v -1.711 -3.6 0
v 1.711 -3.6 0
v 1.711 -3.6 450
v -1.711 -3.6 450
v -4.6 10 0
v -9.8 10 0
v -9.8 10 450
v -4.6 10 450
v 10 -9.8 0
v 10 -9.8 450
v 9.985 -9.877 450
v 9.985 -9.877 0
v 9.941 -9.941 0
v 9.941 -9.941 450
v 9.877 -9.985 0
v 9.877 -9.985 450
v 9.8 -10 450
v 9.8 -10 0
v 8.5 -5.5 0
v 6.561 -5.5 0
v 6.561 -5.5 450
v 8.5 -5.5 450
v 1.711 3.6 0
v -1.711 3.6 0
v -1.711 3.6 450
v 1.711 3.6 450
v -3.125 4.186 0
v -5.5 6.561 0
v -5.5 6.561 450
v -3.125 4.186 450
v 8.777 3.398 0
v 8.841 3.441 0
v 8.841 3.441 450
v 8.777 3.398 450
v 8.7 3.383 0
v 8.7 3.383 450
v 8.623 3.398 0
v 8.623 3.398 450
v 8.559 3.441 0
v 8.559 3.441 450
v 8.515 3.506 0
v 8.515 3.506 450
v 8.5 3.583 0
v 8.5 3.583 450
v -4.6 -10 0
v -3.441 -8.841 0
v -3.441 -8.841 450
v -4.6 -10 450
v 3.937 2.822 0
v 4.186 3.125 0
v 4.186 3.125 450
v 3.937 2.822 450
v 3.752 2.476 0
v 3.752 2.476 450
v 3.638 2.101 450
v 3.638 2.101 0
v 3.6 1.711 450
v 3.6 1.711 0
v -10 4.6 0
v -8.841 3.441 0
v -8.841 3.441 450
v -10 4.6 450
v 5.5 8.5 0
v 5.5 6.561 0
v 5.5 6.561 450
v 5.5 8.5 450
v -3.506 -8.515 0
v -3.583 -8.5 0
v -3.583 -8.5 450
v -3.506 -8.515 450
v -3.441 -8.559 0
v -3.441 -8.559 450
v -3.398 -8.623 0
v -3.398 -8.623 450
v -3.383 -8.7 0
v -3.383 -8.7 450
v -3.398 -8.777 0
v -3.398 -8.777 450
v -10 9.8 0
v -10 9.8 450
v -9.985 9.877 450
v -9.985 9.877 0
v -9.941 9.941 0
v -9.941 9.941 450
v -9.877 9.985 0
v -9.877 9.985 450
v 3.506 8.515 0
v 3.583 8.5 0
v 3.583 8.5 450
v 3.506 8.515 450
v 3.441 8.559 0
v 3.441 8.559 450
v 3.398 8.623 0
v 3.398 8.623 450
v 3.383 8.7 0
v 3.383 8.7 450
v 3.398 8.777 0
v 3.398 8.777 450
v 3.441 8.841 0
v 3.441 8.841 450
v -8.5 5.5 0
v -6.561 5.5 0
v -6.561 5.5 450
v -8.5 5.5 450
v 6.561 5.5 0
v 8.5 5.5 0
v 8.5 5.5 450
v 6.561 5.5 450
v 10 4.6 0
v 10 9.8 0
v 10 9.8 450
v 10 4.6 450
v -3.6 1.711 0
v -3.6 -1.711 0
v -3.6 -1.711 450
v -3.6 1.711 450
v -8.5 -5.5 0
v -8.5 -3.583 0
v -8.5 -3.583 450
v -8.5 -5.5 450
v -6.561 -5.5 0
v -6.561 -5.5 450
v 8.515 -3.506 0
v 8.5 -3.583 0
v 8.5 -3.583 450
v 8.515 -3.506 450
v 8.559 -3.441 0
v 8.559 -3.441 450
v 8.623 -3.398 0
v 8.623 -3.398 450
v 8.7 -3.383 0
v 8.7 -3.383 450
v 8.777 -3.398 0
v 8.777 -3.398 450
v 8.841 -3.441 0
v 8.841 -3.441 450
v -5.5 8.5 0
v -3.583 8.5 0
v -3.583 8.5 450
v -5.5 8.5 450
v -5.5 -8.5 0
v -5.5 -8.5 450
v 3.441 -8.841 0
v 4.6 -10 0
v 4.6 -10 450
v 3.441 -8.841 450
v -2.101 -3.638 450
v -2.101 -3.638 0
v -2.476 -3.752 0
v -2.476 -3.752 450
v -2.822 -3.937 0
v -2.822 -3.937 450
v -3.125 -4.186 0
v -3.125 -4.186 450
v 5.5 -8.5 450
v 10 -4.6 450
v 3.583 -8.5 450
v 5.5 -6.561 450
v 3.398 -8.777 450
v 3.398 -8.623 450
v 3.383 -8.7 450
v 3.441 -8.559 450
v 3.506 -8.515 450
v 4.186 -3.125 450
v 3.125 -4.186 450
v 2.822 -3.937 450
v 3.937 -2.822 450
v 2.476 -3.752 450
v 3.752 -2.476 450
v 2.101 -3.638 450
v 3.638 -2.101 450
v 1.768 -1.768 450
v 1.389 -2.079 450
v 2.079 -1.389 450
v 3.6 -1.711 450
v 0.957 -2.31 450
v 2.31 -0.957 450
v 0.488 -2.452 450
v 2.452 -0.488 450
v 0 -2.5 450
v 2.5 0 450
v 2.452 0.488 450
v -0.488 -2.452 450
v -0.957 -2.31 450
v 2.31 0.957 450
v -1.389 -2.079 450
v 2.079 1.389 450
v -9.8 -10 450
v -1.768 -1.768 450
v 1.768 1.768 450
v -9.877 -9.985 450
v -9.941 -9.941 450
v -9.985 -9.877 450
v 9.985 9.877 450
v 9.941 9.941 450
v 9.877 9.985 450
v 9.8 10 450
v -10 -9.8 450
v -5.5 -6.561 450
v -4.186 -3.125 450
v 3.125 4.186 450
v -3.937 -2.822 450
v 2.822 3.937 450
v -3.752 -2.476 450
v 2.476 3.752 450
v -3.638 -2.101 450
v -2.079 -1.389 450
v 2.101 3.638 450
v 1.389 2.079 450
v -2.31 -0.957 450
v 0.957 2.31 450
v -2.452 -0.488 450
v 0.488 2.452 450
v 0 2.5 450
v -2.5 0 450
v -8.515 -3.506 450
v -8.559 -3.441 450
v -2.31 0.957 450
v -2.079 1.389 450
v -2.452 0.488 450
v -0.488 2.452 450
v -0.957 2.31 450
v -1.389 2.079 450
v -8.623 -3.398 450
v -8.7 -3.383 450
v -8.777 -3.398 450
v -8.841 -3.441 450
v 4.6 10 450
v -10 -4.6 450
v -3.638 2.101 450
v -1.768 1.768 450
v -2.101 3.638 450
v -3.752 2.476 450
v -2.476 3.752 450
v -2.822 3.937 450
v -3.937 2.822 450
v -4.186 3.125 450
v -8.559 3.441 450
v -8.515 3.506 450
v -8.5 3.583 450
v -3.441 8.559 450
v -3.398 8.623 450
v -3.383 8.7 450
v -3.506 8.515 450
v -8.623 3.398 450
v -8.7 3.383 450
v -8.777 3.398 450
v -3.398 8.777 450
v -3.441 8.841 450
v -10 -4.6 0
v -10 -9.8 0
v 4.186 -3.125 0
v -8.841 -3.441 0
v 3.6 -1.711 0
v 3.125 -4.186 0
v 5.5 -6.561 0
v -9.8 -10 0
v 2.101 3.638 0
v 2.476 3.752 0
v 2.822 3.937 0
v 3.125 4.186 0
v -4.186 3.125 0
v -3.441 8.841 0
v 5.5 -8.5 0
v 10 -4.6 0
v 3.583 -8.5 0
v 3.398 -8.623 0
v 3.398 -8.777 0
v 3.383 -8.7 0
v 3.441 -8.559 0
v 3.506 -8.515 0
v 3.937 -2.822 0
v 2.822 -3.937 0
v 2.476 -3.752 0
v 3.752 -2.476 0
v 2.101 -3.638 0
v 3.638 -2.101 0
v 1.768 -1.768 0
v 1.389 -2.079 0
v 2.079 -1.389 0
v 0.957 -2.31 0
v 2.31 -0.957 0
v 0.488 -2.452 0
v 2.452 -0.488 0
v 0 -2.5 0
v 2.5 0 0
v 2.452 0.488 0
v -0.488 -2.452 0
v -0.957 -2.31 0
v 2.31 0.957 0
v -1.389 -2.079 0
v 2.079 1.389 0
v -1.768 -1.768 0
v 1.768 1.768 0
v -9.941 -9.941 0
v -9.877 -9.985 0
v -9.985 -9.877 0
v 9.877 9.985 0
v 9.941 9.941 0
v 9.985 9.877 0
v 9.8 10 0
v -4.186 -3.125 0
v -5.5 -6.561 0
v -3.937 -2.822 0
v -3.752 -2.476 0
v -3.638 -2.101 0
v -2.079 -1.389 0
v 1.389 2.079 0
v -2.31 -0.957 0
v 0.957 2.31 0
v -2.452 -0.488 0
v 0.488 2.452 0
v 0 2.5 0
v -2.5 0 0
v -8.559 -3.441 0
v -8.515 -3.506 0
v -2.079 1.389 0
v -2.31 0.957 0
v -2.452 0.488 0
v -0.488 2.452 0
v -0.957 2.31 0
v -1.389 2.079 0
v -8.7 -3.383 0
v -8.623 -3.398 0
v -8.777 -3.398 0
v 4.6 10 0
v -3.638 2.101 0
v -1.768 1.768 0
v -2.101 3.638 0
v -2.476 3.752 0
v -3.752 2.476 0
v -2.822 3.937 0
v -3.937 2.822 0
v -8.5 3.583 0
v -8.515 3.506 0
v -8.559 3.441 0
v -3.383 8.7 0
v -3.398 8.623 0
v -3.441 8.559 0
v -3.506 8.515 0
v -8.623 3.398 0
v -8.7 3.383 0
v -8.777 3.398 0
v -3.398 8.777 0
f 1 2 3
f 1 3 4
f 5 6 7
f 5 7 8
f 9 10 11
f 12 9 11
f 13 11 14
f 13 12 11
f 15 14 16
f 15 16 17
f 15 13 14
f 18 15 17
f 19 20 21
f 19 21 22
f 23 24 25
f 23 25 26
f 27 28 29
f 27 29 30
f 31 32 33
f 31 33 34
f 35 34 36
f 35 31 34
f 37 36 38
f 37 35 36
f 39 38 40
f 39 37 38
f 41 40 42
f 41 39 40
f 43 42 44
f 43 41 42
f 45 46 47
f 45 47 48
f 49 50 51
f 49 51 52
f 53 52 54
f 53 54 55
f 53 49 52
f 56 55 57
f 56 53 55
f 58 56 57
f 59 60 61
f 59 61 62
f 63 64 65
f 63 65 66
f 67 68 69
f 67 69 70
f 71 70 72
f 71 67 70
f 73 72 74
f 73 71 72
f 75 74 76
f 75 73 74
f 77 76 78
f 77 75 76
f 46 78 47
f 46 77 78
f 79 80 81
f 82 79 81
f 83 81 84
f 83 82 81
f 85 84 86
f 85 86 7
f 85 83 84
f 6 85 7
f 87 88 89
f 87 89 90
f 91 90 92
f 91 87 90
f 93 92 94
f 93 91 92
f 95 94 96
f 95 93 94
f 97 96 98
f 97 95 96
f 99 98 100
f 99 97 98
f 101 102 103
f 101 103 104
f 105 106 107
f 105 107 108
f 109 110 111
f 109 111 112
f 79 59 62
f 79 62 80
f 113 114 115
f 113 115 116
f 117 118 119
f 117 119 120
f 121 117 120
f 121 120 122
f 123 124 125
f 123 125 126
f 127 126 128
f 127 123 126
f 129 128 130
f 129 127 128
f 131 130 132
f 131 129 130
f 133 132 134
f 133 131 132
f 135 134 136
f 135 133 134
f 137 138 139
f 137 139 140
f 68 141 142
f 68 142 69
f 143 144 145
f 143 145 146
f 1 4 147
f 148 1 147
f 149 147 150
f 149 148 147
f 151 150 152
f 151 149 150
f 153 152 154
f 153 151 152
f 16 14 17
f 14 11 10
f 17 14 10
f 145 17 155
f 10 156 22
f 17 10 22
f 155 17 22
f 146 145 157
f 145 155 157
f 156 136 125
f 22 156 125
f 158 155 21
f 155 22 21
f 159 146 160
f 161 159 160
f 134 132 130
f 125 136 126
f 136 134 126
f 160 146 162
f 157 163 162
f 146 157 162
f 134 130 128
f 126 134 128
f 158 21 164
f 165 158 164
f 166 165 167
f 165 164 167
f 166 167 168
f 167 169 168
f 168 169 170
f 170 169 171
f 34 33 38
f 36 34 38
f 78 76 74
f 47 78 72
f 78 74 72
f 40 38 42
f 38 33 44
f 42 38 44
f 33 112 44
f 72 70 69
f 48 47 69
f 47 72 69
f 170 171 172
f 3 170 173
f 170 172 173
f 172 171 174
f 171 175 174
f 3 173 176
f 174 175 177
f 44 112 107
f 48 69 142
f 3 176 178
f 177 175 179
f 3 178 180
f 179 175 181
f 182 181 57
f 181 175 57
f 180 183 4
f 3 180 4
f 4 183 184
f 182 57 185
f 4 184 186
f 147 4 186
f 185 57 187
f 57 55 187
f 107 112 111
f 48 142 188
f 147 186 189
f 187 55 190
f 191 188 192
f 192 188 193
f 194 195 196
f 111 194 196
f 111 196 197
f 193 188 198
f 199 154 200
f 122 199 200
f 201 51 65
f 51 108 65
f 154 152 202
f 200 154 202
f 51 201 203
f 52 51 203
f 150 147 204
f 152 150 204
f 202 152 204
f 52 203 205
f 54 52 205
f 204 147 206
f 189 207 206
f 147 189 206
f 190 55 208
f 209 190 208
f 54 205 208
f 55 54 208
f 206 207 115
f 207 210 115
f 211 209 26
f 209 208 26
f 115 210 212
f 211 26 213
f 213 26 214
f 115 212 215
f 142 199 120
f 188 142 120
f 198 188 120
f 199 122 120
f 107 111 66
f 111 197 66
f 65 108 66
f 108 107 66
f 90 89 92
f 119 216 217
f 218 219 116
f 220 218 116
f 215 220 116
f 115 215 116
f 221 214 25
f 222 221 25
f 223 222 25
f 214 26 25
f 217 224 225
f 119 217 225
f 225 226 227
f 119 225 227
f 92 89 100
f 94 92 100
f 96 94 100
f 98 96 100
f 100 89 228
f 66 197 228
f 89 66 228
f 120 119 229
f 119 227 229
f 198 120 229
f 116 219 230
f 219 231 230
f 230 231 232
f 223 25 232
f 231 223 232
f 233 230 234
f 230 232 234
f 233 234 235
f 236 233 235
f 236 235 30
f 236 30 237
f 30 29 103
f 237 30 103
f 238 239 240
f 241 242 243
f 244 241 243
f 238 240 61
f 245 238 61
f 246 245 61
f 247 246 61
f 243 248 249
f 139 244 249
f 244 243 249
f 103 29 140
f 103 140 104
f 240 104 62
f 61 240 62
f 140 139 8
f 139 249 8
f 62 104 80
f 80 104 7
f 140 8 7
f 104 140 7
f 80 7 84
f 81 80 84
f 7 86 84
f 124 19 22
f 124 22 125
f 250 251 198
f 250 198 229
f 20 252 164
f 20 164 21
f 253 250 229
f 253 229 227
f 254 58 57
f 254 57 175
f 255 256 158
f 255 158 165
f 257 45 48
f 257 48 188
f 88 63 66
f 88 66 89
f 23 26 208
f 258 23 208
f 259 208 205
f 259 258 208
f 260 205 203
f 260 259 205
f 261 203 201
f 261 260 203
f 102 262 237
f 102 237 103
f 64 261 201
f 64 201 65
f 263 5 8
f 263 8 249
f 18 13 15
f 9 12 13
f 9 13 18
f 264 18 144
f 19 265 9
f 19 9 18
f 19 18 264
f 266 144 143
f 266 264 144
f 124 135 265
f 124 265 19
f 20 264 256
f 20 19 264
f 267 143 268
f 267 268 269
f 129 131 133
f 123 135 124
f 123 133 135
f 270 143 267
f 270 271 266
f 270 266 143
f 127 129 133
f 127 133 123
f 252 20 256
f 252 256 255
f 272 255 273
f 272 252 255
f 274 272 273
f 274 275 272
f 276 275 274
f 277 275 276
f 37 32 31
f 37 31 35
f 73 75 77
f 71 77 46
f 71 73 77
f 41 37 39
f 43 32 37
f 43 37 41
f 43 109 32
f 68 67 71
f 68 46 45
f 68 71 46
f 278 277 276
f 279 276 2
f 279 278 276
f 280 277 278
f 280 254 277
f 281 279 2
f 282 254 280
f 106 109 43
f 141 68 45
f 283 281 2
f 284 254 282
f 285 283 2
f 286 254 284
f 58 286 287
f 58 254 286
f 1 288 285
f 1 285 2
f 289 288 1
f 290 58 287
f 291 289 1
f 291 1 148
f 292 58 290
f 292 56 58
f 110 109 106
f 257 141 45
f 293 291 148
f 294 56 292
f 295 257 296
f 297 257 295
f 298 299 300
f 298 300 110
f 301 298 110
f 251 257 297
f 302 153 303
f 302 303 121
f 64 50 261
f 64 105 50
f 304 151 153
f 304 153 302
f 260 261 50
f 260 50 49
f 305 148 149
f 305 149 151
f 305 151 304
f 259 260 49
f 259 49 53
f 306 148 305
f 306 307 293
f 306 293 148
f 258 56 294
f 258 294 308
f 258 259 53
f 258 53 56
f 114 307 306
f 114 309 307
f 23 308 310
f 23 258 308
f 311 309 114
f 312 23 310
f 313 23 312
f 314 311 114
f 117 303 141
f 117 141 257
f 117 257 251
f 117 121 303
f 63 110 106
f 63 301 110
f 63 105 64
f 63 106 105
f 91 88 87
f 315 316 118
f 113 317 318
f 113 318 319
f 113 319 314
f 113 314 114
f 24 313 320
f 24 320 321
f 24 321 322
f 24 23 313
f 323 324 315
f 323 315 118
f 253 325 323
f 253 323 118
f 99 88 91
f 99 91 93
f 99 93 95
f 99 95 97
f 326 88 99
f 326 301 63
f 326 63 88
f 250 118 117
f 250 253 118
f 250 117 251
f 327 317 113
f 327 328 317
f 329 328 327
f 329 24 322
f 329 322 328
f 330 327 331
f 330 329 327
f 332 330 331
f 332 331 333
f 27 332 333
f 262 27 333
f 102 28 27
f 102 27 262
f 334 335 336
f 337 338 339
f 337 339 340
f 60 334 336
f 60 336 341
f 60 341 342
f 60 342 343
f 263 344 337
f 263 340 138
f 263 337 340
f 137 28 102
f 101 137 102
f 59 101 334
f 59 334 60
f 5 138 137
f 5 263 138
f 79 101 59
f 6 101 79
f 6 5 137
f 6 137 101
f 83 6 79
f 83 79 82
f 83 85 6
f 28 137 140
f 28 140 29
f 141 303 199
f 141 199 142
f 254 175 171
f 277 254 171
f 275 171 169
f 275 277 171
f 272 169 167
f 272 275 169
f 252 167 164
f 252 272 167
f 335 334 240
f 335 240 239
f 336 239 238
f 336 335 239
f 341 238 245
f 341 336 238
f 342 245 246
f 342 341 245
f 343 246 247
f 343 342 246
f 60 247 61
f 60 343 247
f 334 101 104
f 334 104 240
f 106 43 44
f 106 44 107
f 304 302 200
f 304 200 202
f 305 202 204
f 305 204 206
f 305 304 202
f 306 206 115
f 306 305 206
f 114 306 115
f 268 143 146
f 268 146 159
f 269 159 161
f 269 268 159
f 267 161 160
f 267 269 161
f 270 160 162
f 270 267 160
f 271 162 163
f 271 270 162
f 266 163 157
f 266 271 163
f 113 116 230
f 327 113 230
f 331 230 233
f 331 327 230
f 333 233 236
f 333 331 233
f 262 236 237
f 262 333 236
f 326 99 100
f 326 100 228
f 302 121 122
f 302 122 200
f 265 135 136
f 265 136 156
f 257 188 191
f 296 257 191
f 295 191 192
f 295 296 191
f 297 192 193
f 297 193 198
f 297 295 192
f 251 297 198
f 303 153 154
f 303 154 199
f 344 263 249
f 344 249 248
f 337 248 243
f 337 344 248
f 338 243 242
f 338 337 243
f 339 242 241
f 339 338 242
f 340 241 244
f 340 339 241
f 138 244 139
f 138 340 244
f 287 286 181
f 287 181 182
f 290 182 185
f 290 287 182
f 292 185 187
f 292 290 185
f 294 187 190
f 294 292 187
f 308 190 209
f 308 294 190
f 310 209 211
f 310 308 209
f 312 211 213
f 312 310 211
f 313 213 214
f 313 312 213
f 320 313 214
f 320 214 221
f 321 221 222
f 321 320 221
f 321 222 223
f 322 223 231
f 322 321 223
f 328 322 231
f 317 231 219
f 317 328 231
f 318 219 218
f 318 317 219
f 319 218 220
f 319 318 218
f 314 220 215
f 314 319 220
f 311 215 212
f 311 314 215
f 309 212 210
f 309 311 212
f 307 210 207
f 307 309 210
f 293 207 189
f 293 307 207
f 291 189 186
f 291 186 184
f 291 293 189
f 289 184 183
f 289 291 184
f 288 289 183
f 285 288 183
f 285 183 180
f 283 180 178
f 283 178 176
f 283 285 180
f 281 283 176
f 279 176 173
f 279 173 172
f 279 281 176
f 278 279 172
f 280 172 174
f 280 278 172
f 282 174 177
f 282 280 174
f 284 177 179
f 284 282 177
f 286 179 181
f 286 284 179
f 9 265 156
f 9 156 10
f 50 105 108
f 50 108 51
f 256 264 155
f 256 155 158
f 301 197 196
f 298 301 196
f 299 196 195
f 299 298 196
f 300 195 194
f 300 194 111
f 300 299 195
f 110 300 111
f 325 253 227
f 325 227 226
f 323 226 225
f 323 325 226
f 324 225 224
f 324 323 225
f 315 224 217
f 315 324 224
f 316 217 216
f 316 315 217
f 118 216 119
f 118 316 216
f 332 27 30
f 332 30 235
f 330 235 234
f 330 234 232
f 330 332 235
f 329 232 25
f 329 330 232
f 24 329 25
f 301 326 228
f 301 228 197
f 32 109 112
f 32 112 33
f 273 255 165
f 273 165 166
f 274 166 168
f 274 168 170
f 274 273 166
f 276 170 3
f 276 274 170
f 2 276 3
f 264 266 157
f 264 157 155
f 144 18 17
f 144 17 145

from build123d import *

# Parameters (mm, degrees)
ESBO_O1_R                = 2.5
RESSALTO_EXTRUS_O1_DEPTH = 450


with BuildPart() as part:
    # Esboço1 → Ressalto-extrusão1 (new body)
    with BuildSketch(Plane.XY):
        with BuildLine():
            Line((-4.6, -10), (-9.8, -10))
            ThreePointArc((-9.8, -10), (-9.941421356, -9.941421356), (-10, -9.8))
            Line((-10, -9.8), (-10, -4.6))
            Line((-10, -4.6), (-8.841421356, -3.441421356))
            ThreePointArc((-8.841421356, -3.441421356), (-8.623463314, -3.398066806), (-8.5, -3.582842712))
            Line((-8.5, -3.582842712), (-8.5, -5.5))
            Line((-8.5, -5.5), (-6.560660172, -5.5))
            Line((-6.560660172, -5.5), (-4.185786438, -3.125126266))
            ThreePointArc((-4.185786438, -3.125126266), (-3.752240935, -2.476279568), (-3.6, -1.710912703))
            Line((-3.6, -1.710912703), (-3.6, 1.710912703))
            ThreePointArc((-3.6, 1.710912703), (-3.752240935, 2.476279568), (-4.185786438, 3.125126266))
            Line((-4.185786438, 3.125126266), (-6.560660172, 5.5))
            Line((-6.560660172, 5.5), (-8.5, 5.5))
            Line((-8.5, 5.5), (-8.5, 3.582842712))
            ThreePointArc((-8.5, 3.582842712), (-8.623463314, 3.398066806), (-8.841421356, 3.441421356))
            Line((-8.841421356, 3.441421356), (-10, 4.6))
            Line((-10, 4.6), (-10, 9.8))
            ThreePointArc((-10, 9.8), (-9.941421356, 9.941421356), (-9.8, 10))
            Line((-9.8, 10), (-4.6, 10))
            Line((-4.6, 10), (-3.441421356, 8.841421356))
            ThreePointArc((-3.441421356, 8.841421356), (-3.398066806, 8.623463314), (-3.582842712, 8.5))
            Line((-3.582842712, 8.5), (-5.5, 8.5))
            Line((-5.5, 8.5), (-5.5, 6.560660172))
            Line((-5.5, 6.560660172), (-3.125126266, 4.185786438))
            ThreePointArc((-3.125126266, 4.185786438), (-2.476279568, 3.752240935), (-1.710912703, 3.6))
            Line((-1.710912703, 3.6), (1.710912703, 3.6))
            ThreePointArc((1.710912703, 3.6), (2.476279568, 3.752240935), (3.125126266, 4.185786438))
            Line((3.125126266, 4.185786438), (5.5, 6.560660172))
            Line((5.5, 6.560660172), (5.5, 8.5))
            Line((5.5, 8.5), (3.582842712, 8.5))
            ThreePointArc((3.582842712, 8.5), (3.398066806, 8.623463314), (3.441421356, 8.841421356))
            Line((3.441421356, 8.841421356), (4.6, 10))
            Line((4.6, 10), (9.8, 10))
            ThreePointArc((9.8, 10), (9.941421356, 9.941421356), (10, 9.8))
            Line((10, 9.8), (10, 4.6))
            Line((10, 4.6), (8.841421356, 3.441421356))
            ThreePointArc((8.841421356, 3.441421356), (8.623463314, 3.398066806), (8.5, 3.582842712))
            Line((8.5, 3.582842712), (8.5, 5.5))
            Line((8.5, 5.5), (6.560660172, 5.5))
            Line((6.560660172, 5.5), (4.185786438, 3.125126266))
            ThreePointArc((4.185786438, 3.125126266), (3.752240935, 2.476279568), (3.6, 1.710912703))
            Line((3.6, 1.710912703), (3.6, -1.710912703))
            ThreePointArc((3.6, -1.710912703), (3.752240935, -2.476279568), (4.185786438, -3.125126266))
            Line((4.185786438, -3.125126266), (6.560660172, -5.5))
            Line((6.560660172, -5.5), (8.5, -5.5))
            Line((8.5, -5.5), (8.5, -3.582842712))
            ThreePointArc((8.5, -3.582842712), (8.623463314, -3.398066806), (8.841421356, -3.441421356))
            Line((8.841421356, -3.441421356), (10, -4.6))
            Line((10, -4.6), (10, -9.8))
            ThreePointArc((10, -9.8), (9.941421356, -9.941421356), (9.8, -10))
            Line((9.8, -10), (4.6, -10))
            Line((4.6, -10), (3.441421356, -8.841421356))
            ThreePointArc((3.441421356, -8.841421356), (3.398066806, -8.623463314), (3.582842712, -8.5))
            Line((3.582842712, -8.5), (5.5, -8.5))
            Line((5.5, -8.5), (5.5, -6.560660172))
            Line((5.5, -6.560660172), (3.125126266, -4.185786438))
            ThreePointArc((3.125126266, -4.185786438), (2.476279568, -3.752240935), (1.710912703, -3.6))
            Line((1.710912703, -3.6), (-1.710912703, -3.6))
            ThreePointArc((-1.710912703, -3.6), (-2.476279568, -3.752240935), (-3.125126266, -4.185786438))
            Line((-3.125126266, -4.185786438), (-5.5, -6.560660172))
            Line((-5.5, -6.560660172), (-5.5, -8.5))
            Line((-5.5, -8.5), (-3.582842712, -8.5))
            ThreePointArc((-3.582842712, -8.5), (-3.398066806, -8.623463314), (-3.441421356, -8.841421356))
            Line((-3.441421356, -8.841421356), (-4.6, -10))
        make_face()
        Circle(ESBO_O1_R, mode=Mode.SUBTRACT)
    extrude(amount=RESSALTO_EXTRUS_O1_DEPTH)


solid = part.part
